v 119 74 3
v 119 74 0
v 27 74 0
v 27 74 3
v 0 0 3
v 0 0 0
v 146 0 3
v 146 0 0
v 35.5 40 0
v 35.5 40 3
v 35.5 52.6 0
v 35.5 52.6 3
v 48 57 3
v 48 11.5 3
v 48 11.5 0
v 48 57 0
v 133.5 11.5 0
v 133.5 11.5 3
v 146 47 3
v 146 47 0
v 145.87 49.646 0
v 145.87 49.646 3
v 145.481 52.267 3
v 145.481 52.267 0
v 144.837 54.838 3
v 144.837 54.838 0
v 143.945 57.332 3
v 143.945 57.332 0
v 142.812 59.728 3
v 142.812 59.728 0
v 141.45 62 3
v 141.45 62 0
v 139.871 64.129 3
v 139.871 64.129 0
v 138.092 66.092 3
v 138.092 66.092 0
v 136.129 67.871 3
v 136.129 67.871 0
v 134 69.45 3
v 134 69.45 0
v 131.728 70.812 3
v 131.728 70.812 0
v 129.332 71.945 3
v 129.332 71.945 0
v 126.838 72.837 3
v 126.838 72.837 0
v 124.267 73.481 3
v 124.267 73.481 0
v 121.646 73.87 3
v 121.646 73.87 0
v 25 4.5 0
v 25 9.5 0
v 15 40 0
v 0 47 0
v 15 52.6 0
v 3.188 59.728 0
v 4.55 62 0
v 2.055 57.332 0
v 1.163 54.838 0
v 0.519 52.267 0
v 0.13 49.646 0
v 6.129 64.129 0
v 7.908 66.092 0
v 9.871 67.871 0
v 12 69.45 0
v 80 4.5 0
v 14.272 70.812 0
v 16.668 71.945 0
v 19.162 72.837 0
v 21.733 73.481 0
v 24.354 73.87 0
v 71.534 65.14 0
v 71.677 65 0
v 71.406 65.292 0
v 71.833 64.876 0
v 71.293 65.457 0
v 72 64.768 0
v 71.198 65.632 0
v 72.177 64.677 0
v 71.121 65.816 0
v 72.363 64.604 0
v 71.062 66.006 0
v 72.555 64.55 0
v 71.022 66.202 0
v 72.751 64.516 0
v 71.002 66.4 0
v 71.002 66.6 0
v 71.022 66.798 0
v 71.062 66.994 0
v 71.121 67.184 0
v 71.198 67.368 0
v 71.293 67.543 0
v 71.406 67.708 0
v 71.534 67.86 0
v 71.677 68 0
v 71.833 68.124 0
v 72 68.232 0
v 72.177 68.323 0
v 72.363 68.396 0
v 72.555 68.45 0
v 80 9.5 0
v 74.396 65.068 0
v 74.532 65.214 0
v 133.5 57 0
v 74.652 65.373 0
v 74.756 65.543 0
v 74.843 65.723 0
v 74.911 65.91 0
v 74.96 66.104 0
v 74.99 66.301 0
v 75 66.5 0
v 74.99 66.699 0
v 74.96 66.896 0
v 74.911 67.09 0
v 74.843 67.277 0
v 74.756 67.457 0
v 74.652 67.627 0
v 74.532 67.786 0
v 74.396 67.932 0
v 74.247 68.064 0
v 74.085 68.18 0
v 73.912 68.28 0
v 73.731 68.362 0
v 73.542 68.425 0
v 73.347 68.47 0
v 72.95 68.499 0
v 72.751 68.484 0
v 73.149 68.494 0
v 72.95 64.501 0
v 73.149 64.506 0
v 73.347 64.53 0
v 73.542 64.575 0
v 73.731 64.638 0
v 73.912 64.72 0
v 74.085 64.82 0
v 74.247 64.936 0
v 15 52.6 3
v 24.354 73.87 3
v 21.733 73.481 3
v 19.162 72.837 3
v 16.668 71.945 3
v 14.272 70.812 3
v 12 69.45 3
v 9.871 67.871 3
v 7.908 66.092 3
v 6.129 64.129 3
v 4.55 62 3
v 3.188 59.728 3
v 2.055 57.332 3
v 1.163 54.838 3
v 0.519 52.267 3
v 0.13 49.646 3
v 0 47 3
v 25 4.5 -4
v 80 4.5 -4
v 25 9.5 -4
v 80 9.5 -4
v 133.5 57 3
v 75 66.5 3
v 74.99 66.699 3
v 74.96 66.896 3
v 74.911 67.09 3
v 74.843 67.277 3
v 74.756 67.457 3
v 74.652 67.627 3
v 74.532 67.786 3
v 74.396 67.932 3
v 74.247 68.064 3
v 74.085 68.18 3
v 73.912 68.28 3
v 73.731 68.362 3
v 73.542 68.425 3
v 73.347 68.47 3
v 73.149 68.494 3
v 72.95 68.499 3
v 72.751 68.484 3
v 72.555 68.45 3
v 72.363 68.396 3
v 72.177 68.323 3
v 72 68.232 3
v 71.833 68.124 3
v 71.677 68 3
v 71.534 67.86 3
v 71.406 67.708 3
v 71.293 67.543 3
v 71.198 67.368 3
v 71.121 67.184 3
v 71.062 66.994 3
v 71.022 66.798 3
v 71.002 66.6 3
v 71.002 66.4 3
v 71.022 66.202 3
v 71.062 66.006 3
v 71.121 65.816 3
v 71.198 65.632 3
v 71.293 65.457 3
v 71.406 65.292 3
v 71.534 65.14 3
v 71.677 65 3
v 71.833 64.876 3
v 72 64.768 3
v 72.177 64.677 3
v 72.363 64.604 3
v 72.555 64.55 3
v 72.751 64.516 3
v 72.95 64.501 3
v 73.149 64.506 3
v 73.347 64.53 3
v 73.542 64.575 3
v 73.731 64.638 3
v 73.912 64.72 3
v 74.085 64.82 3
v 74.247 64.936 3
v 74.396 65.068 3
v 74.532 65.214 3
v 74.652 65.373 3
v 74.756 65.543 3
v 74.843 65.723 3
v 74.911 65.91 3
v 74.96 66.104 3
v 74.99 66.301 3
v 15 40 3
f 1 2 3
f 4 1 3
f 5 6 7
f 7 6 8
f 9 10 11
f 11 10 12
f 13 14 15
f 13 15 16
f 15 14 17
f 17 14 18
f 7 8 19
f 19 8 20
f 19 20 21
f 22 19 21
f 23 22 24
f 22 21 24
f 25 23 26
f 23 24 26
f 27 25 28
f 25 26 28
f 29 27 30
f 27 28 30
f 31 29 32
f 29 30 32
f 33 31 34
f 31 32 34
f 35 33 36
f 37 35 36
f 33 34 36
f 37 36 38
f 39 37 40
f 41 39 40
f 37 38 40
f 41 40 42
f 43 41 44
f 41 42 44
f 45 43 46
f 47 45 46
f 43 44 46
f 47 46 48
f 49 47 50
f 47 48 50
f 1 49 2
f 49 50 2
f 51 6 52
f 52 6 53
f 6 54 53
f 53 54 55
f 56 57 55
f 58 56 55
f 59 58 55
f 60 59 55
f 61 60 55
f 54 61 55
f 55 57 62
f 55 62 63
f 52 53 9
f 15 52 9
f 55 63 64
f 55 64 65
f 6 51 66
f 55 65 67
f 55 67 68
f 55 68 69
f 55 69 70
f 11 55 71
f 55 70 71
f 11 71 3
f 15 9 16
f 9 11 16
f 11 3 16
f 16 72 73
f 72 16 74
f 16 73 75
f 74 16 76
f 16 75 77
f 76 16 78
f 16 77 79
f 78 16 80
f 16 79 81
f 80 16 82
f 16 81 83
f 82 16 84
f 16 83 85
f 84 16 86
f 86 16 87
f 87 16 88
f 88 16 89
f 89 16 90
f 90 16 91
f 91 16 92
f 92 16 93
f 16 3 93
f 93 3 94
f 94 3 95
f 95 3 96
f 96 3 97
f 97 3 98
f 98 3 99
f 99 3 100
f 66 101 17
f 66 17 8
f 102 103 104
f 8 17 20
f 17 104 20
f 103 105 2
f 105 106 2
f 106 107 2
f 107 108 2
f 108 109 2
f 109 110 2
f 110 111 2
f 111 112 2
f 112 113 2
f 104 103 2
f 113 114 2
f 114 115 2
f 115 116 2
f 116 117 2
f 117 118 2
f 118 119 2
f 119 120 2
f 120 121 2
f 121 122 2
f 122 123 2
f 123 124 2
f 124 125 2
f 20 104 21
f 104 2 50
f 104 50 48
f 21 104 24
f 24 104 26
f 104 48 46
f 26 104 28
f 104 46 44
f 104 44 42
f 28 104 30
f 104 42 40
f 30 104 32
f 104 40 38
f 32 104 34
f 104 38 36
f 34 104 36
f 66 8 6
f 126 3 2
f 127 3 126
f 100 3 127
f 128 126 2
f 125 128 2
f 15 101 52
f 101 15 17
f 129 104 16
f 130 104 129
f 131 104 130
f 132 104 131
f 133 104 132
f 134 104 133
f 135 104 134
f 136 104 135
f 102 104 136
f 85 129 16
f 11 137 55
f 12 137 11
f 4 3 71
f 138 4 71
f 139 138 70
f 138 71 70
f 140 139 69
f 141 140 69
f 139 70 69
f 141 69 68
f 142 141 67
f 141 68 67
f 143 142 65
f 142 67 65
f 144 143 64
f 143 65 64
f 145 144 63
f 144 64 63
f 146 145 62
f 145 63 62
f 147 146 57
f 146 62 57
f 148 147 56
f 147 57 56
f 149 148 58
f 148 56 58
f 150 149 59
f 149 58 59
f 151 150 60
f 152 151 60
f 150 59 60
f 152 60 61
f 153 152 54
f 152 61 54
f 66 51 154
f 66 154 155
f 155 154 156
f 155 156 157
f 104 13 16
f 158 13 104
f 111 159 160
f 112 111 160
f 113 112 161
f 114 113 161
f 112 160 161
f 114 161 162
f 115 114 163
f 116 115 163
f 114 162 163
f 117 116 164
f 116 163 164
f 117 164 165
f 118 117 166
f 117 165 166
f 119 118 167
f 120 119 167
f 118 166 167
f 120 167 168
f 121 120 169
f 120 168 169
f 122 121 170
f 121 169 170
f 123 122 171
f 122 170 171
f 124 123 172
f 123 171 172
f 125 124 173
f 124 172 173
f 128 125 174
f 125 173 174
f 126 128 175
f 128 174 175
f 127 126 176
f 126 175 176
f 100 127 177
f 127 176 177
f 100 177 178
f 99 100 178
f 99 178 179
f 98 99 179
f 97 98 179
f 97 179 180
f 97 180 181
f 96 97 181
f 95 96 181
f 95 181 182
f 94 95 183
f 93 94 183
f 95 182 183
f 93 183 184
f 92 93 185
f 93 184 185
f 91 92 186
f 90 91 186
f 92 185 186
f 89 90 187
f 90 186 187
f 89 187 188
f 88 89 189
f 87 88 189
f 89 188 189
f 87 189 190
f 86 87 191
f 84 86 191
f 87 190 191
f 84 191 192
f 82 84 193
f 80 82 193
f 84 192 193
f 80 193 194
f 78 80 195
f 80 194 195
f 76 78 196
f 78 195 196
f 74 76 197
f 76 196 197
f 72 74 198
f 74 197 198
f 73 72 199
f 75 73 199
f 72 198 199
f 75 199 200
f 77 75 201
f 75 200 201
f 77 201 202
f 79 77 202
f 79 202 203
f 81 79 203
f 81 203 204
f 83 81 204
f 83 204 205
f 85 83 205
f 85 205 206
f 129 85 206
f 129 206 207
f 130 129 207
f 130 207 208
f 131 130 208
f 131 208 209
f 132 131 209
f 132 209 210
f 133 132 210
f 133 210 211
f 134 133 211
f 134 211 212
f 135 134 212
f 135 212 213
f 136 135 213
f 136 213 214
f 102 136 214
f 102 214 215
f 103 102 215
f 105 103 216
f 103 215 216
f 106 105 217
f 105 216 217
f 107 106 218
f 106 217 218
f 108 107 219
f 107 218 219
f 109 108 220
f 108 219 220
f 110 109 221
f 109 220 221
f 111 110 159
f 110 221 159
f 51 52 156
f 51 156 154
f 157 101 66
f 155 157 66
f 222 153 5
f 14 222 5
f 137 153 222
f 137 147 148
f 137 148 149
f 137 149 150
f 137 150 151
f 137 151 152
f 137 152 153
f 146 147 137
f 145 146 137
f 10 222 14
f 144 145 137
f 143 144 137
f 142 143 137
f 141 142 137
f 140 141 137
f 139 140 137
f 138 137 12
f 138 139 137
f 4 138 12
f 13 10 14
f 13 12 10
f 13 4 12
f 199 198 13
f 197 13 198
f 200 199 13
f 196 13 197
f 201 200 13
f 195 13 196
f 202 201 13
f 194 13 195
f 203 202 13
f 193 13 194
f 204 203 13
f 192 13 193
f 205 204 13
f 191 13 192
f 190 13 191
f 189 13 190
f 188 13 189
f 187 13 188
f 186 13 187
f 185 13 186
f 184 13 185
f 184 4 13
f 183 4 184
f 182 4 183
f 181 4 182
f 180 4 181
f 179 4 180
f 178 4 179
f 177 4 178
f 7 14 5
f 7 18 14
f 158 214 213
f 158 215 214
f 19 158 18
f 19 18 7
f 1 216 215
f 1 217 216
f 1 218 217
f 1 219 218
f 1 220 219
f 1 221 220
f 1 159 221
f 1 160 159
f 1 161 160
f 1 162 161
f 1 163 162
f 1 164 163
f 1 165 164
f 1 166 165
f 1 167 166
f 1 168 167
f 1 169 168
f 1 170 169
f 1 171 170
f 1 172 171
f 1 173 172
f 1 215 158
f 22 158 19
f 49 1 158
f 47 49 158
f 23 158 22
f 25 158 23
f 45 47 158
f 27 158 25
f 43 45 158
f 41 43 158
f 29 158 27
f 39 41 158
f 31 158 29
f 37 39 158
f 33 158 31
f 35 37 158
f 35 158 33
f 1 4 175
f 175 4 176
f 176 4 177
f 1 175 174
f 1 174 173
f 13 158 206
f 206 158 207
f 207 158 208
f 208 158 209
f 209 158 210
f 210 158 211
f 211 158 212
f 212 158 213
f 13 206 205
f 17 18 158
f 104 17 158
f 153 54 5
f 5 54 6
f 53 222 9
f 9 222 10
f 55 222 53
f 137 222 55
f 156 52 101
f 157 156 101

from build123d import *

# Parameters (mm, degrees)
F1_DEPTH = 3
F2_W     = 20.5
F2_H     = 12.6
F2_R     = 2
F2_W_2   = 85.5
F2_H_2   = 45.5
F3_DEPTH = 3
F4_W     = 55
F4_H     = 5
F5_DEPTH = 4


with BuildPart() as f1:
    # F0 (on Top) → F1 (new body)
    with BuildSketch(Plane.XY):
        with BuildLine():
            Line((0, 0), (2.5, 0))
            Line((2.5, 0), (143.5, 0))
            Line((143.5, 0), (146, 0))
            Line((146, 0), (146, 4.25))
            Line((146, 4.25), (146, 47))
            ThreePointArc((146, 47), (138.091883, 66.091883), (119, 74))
            Line((119, 74), (27, 74))
            ThreePointArc((27, 74), (7.908117, 66.091883), (0, 47))
            Line((0, 47), (0, 4.25))
            Line((0, 4.25), (0, 0))
        make_face()
    extrude(amount=F1_DEPTH)

    # F2 (on face) → F3 (cut)
    with BuildSketch(Plane.XY.offset(3)):
        with Locations((25.25, 46.3)):
            Rectangle(F2_W, F2_H)
        with Locations((73, 66.5)):
            Circle(F2_R)
        with Locations((90.75, 34.25)):
            Rectangle(F2_W_2, F2_H_2)
    extrude(amount=-F3_DEPTH, mode=Mode.SUBTRACT)

    # F4 (on face) → F5 (join)
    with BuildSketch(Plane(origin=(0, 0, 0), x_dir=(1, 0, 0), z_dir=(0, 0, -1))):
        with Locations((52.5, -7)):
            Rectangle(F4_W, F4_H)
    extrude(amount=F5_DEPTH)


solid = f1.part
